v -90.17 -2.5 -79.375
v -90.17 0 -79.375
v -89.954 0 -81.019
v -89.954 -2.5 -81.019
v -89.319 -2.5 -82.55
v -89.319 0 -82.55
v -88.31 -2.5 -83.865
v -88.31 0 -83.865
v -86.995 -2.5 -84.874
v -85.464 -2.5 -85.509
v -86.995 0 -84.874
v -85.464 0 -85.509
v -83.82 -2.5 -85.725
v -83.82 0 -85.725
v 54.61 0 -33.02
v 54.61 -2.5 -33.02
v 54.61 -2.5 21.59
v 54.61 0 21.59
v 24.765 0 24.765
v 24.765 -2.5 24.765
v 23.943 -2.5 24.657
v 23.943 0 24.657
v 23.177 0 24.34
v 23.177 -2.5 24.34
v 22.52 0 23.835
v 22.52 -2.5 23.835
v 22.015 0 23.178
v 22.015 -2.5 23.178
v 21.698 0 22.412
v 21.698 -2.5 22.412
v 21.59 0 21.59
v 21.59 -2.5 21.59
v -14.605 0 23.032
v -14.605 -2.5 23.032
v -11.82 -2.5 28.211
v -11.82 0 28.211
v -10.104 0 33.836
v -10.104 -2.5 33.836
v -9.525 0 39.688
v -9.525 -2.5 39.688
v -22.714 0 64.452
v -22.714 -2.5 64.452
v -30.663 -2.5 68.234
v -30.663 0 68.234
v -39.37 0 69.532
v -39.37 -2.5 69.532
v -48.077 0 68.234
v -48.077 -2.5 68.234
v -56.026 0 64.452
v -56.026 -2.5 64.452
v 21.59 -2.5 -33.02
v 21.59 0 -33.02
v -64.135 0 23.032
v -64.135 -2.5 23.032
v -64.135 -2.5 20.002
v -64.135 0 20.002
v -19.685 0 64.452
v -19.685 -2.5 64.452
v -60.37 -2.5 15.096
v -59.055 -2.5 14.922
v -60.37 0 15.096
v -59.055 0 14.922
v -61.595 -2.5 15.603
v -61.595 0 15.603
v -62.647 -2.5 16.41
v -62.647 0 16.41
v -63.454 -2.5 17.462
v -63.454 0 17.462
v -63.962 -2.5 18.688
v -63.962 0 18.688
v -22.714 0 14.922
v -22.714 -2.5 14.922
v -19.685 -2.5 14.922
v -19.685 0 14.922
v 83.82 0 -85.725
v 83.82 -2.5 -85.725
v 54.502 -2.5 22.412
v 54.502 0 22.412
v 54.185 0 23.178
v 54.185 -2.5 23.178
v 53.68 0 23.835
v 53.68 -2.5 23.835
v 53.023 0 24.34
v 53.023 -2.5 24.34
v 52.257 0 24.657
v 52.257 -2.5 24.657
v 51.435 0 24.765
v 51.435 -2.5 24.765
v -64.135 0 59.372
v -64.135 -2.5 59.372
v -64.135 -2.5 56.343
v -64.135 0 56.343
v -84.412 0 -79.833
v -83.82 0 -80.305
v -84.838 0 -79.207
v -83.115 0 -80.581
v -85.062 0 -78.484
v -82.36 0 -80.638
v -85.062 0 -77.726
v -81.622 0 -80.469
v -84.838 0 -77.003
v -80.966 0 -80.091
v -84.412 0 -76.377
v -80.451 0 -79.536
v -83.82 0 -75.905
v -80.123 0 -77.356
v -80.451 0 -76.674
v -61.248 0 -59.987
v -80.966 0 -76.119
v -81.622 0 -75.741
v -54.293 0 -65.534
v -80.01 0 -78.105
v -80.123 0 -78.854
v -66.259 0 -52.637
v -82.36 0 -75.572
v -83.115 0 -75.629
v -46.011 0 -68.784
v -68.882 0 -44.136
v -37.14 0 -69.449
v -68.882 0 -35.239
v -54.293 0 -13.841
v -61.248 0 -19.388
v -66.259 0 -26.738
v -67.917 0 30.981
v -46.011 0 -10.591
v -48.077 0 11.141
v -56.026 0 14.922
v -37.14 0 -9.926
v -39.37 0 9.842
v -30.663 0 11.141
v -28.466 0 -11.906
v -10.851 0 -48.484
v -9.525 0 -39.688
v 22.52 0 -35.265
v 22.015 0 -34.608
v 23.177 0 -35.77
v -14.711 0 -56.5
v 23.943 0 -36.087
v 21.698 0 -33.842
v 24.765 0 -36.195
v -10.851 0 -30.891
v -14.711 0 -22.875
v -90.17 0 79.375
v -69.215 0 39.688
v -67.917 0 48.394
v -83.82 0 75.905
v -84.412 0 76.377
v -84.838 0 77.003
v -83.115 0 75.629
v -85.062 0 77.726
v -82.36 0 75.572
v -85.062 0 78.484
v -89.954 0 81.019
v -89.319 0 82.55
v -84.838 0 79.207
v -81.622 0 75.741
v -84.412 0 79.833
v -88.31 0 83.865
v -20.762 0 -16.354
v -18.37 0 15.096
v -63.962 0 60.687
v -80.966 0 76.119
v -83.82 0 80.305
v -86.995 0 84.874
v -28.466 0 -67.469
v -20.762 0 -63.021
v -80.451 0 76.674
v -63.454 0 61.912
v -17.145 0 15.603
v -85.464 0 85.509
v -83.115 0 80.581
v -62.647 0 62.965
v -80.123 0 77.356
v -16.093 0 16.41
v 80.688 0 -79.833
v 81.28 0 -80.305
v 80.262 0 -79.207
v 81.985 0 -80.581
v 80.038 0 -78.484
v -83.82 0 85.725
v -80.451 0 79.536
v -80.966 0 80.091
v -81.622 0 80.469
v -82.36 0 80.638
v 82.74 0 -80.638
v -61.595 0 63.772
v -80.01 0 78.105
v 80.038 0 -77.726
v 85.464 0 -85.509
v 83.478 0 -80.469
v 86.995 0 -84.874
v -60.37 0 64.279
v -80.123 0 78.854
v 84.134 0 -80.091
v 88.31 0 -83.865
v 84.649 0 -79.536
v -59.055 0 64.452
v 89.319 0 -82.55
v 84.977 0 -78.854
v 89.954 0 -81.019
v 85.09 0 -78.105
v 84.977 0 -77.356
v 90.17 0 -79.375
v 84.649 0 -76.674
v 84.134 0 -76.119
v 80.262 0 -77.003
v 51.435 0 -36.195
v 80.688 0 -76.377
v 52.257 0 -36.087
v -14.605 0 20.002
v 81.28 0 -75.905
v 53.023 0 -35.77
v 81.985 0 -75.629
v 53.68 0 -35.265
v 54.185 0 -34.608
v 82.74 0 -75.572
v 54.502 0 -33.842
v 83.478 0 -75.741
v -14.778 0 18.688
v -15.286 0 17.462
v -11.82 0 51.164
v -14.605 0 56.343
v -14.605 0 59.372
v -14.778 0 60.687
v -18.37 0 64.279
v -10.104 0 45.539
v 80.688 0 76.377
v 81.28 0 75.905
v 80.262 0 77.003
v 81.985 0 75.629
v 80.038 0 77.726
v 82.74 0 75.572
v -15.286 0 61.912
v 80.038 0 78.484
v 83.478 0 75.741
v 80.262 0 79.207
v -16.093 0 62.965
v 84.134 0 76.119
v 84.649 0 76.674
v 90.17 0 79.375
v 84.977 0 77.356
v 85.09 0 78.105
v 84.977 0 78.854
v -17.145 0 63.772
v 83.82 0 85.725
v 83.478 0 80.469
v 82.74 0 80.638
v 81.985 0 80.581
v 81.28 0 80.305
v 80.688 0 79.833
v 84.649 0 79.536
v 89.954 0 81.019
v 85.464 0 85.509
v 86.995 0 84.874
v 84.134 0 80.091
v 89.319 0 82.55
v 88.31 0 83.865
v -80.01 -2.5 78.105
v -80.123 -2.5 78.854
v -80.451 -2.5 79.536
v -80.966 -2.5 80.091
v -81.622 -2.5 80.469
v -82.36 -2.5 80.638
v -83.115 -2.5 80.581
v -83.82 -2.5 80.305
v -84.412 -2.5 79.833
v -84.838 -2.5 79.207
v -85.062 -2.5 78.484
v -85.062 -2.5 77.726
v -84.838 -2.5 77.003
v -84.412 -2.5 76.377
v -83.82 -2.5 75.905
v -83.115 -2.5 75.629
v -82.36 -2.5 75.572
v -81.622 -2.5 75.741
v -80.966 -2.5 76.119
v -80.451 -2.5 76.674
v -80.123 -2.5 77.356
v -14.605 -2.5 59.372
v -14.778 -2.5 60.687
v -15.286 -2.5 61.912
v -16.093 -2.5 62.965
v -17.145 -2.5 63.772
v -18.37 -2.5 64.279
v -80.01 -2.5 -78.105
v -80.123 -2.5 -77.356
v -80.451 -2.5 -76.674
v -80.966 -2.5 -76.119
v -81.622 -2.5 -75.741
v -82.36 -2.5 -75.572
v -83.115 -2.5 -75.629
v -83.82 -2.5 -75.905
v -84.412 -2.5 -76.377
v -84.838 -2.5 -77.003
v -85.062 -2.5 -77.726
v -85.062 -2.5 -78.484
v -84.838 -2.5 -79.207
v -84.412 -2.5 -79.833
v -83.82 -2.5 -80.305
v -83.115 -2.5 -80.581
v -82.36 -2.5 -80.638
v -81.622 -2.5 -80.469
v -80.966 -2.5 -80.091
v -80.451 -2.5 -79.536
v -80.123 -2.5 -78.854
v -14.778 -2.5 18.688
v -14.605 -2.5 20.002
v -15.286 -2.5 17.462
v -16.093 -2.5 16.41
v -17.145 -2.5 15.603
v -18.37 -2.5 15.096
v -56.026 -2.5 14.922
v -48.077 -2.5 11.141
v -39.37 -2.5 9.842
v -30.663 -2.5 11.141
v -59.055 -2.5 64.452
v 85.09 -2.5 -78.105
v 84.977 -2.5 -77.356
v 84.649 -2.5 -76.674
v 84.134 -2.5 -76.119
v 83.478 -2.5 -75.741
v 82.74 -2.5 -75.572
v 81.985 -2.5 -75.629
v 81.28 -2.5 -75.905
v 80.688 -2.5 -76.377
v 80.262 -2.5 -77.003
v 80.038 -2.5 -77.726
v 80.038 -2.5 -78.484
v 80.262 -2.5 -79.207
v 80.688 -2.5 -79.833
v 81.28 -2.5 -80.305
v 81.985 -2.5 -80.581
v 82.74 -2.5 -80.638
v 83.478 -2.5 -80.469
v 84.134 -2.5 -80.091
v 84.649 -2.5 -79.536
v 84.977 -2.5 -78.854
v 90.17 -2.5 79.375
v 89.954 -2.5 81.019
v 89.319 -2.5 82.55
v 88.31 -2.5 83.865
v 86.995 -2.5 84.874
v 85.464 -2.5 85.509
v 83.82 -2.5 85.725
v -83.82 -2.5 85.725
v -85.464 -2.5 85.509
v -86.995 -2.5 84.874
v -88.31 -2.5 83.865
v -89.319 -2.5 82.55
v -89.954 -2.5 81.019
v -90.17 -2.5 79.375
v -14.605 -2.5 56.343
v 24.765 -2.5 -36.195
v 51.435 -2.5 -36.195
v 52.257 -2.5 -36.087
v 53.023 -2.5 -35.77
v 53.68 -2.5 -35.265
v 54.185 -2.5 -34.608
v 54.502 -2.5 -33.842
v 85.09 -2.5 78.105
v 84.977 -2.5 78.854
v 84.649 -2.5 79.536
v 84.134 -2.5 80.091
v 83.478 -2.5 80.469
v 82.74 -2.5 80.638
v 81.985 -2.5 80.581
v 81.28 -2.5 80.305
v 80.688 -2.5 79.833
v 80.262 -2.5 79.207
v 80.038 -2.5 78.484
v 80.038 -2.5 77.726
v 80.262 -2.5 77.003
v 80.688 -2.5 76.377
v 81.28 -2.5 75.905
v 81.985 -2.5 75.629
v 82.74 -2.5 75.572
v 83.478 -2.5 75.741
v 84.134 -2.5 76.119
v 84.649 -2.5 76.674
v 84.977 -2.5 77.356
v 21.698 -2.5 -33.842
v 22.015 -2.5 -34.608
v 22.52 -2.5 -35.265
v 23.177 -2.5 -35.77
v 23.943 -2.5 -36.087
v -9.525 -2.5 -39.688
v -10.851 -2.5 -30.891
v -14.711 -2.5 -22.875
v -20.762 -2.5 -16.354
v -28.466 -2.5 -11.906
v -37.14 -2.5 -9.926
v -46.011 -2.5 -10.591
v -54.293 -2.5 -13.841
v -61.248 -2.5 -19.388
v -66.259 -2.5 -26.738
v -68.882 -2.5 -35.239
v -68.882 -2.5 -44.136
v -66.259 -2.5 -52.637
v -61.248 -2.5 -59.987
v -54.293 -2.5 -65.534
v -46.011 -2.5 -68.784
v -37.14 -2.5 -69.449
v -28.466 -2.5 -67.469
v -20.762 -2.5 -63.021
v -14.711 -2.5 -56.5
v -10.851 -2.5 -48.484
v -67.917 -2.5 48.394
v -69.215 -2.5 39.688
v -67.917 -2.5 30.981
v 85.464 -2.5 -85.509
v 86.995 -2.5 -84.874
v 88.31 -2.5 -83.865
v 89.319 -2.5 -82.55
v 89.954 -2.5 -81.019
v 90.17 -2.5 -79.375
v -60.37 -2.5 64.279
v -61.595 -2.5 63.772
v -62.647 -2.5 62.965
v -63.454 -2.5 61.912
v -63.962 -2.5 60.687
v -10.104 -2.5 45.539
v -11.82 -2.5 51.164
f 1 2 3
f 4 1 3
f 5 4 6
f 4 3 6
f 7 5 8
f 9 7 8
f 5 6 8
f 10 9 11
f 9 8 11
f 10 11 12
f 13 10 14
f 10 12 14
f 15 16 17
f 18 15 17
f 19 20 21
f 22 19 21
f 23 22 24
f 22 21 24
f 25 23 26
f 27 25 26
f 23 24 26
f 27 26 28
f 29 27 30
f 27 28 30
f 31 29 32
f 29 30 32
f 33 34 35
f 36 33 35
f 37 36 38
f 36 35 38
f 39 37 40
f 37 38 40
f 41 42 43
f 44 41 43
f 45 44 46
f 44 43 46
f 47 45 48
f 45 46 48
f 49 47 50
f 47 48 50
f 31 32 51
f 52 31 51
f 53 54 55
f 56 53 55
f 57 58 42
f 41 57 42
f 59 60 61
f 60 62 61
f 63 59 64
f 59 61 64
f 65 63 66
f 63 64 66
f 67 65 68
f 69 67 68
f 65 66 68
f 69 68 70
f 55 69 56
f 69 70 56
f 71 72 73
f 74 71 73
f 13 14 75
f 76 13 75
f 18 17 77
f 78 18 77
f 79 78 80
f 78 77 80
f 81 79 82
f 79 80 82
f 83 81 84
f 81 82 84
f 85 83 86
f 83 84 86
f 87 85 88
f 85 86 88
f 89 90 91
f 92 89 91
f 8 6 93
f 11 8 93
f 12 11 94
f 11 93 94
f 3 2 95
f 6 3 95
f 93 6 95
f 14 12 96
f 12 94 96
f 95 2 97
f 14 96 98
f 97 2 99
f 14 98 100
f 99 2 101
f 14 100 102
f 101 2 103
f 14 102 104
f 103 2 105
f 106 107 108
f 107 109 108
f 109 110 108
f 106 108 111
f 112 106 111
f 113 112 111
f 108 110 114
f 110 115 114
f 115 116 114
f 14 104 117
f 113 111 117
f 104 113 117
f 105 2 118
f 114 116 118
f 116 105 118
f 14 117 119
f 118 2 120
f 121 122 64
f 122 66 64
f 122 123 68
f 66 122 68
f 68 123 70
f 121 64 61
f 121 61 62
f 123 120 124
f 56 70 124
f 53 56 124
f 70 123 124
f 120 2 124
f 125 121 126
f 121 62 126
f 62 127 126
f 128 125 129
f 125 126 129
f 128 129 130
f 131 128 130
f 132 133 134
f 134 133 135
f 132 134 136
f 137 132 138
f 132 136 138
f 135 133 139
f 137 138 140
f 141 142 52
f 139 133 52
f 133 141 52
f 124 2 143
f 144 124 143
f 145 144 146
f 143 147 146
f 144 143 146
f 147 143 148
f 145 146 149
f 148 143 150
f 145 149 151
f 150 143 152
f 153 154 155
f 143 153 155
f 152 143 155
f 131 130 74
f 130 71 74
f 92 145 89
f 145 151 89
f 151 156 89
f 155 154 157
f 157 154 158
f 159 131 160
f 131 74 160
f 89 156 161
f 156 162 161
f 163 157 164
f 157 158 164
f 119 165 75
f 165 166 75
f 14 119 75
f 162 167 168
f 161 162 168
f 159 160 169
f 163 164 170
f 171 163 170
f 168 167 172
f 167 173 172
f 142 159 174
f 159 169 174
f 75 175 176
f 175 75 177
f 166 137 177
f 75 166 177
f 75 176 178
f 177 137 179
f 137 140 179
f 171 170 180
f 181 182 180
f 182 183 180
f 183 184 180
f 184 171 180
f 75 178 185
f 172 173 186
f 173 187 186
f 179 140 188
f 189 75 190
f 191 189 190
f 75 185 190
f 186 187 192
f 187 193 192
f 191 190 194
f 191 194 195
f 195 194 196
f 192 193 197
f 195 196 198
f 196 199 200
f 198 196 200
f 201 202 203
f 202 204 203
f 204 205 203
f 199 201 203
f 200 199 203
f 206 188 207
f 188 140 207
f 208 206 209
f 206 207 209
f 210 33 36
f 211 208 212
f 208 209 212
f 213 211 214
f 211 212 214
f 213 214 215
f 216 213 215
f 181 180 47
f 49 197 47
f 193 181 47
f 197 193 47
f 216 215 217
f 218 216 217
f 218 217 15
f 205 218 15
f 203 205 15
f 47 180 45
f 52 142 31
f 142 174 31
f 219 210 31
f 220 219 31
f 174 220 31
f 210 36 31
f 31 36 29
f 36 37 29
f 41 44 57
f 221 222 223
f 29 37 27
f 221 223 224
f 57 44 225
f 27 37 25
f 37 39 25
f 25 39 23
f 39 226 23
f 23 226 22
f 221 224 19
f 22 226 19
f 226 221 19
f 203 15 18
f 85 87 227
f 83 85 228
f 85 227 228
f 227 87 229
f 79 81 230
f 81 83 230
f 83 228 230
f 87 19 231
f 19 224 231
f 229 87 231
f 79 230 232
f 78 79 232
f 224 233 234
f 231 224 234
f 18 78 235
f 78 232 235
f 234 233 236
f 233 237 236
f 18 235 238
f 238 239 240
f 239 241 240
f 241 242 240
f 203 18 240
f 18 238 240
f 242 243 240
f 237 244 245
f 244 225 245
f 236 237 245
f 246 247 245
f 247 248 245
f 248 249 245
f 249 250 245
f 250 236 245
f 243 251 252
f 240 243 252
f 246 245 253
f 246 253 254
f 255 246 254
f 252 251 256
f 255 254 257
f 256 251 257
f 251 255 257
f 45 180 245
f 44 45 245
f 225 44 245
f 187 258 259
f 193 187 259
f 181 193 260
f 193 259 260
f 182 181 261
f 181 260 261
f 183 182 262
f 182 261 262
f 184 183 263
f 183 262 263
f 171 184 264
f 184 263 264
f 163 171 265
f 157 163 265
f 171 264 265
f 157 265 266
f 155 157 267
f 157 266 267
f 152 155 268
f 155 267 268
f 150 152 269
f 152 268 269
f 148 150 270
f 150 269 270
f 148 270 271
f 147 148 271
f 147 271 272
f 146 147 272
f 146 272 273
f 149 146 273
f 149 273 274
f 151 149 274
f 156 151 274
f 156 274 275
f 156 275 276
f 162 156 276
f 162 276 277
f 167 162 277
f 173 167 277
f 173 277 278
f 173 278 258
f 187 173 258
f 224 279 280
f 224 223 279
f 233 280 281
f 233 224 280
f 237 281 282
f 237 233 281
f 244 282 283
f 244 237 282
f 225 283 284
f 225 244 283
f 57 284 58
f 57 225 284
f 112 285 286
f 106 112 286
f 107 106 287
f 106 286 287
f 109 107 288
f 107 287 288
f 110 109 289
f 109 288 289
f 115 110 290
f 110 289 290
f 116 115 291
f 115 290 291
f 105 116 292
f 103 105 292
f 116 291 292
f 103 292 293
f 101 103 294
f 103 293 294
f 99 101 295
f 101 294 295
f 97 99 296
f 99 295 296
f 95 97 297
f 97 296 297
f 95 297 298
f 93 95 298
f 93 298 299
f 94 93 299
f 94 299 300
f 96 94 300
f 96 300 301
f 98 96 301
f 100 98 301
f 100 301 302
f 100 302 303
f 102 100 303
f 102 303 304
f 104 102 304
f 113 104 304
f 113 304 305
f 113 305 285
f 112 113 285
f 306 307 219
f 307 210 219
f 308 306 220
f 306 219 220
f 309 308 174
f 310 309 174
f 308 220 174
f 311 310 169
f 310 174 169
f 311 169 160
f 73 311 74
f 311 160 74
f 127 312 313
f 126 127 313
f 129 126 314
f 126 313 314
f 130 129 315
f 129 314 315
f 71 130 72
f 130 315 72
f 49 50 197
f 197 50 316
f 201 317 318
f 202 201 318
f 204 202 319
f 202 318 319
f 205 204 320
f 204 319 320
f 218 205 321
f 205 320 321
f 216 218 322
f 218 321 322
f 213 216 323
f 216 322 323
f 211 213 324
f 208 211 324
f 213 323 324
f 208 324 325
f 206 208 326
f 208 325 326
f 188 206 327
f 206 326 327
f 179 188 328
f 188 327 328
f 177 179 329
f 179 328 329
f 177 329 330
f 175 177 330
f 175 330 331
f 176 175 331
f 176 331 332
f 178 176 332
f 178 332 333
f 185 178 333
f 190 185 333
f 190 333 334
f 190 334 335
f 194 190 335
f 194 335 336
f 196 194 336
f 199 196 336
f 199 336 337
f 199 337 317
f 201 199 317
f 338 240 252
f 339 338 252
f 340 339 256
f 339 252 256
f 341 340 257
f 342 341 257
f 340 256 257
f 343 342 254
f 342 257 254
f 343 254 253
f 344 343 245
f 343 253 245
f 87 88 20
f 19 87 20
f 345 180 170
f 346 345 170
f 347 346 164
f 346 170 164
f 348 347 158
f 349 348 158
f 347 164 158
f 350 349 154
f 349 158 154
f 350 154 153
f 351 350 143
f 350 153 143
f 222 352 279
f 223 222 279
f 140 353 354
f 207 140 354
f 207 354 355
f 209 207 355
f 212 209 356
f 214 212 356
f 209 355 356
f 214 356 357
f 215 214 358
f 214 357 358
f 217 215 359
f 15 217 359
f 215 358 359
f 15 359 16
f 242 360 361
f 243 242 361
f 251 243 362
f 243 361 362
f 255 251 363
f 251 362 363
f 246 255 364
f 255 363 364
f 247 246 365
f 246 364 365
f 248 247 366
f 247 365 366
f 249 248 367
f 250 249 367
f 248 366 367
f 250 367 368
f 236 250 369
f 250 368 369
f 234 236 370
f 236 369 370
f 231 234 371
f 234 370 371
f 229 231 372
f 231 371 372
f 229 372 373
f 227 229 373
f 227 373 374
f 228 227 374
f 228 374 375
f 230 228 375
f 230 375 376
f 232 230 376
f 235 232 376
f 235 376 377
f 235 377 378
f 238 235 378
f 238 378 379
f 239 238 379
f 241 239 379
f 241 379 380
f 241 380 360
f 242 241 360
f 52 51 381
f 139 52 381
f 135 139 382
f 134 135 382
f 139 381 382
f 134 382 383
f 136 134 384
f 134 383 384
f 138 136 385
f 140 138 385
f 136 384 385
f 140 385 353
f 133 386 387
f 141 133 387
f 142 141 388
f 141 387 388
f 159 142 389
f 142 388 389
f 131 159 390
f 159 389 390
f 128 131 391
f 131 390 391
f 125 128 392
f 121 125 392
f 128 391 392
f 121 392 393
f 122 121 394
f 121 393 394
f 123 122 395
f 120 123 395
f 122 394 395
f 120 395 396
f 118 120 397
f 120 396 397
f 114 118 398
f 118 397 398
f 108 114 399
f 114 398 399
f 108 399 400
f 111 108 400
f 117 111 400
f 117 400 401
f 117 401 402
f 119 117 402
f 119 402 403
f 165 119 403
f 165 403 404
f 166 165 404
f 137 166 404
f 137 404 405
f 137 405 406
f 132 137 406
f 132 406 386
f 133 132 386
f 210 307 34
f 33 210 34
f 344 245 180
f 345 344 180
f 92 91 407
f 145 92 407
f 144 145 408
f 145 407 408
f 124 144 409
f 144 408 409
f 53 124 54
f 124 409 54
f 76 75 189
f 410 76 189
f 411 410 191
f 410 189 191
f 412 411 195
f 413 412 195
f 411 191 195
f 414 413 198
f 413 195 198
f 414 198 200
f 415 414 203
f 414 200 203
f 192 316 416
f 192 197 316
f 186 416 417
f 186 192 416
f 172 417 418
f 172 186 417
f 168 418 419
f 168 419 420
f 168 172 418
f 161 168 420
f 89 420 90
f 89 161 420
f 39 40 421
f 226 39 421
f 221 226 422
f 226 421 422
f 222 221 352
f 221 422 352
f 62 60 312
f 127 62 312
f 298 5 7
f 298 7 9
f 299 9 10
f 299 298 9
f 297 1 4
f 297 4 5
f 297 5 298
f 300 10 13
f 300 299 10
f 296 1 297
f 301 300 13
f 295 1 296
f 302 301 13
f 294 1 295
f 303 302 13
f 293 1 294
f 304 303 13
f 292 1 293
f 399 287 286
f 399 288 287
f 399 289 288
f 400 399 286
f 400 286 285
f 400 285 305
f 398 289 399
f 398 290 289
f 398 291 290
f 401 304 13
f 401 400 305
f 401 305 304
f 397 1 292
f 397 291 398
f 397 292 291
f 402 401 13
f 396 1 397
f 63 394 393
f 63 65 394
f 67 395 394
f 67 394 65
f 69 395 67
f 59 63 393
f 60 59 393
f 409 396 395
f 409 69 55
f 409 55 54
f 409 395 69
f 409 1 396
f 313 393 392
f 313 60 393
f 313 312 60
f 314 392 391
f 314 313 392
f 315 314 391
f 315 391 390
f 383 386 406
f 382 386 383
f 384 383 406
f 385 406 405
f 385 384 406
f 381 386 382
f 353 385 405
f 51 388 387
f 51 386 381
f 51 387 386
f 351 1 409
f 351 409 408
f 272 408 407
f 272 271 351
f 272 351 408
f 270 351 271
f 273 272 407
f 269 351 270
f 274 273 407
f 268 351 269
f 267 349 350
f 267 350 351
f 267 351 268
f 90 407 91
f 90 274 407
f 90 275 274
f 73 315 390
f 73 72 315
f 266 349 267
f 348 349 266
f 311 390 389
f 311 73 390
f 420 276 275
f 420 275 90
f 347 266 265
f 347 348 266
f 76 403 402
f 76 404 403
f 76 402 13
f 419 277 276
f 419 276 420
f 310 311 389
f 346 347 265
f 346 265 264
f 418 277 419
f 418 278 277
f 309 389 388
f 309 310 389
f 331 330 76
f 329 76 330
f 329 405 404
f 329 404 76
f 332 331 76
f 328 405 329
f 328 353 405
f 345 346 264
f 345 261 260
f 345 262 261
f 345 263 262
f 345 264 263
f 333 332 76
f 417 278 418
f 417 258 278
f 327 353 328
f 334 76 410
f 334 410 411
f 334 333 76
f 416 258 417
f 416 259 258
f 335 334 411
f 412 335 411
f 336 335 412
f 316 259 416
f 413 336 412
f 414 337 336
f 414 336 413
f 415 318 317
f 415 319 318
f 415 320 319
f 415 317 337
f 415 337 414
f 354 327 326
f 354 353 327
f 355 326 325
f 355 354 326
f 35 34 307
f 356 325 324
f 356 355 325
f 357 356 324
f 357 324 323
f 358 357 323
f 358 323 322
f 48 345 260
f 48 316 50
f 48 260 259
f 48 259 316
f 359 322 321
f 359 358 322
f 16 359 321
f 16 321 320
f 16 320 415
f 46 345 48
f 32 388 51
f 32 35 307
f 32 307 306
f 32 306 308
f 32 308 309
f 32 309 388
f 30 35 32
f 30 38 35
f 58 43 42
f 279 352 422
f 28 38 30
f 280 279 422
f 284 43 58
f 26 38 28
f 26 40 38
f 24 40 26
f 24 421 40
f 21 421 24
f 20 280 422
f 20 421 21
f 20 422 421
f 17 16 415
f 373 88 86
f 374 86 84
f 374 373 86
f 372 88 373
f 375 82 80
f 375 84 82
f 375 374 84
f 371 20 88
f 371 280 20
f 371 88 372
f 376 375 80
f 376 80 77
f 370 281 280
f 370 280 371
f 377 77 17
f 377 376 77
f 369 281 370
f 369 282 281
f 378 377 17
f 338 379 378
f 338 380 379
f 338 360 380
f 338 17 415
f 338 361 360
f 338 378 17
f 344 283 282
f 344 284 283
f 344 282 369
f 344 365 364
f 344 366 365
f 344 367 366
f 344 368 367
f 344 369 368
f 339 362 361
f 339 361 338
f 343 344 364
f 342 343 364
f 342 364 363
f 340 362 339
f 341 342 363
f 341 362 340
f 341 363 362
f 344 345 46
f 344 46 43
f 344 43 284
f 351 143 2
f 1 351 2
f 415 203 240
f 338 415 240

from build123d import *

# Parameters (mm, degrees)
F1_DEPTH = 2.5
F3_DEPTH = 25.4
F4_R     = 29.845
F5_DEPTH = 25.4
F6_R     = 2.54
F7_DEPTH = 25.4
F8_R     = 5.08


with BuildPart() as f1:
    # F0 (on Front) → F1 (new body)
    with BuildSketch(Plane.XZ):
        with BuildLine():
            ThreePointArc((90.17, 79.375), (88.3101280605, 83.8651280605), (83.82, 85.725))
            Line((83.82, 85.725), (-83.82, 85.725))
            ThreePointArc((-83.82, 85.725), (-88.3101280605, 83.8651280605), (-90.17, 79.375))
            Line((-90.17, 79.375), (-90.17, -79.375))
            ThreePointArc((-90.17, -79.375), (-88.3101280605, -83.8651280605), (-83.82, -85.725))
            Line((-83.82, -85.725), (83.82, -85.725))
            ThreePointArc((83.82, -85.725), (88.3101280605, -83.8651280605), (90.17, -79.375))
            Line((90.17, -79.375), (90.17, 79.375))
        make_face()
    extrude(amount=F1_DEPTH)

    # F2 (on face) → F3 (cut)
    with BuildSketch(Plane.XZ.offset(2.5)):
        with BuildLine():
            Line((51.435, 24.765), (24.765, 24.765))
            ThreePointArc((24.765, 24.765), (22.5199359697, 23.8350640303), (21.59, 21.59))
            Line((21.59, 21.59), (21.59, -33.02))
            ThreePointArc((21.59, -33.02), (22.5199359697, -35.2650640303), (24.765, -36.195))
            Line((24.765, -36.195), (51.435, -36.195))
            ThreePointArc((51.435, -36.195), (53.6800640303, -35.2650640303), (54.61, -33.02))
            Line((54.61, -33.02), (54.61, 21.59))
            ThreePointArc((54.61, 21.59), (53.6800640303, 23.8350640303), (51.435, 24.765))
        make_face()
    extrude(amount=-F3_DEPTH, mode=Mode.SUBTRACT)

    # F4 (on face) → F5 (cut)
    with BuildSketch(Plane.XZ.offset(2.5)):
        with BuildLine():
            ThreePointArc((-14.605, 23.0316061483), (-10.8232361729, 30.9808186575), (-9.525, 39.6875))
            ThreePointArc((-9.525, 39.6875), (-10.8232361729, 48.3941813425), (-14.605, 56.3433938517))
            Line((-14.605, 56.3433938517), (-14.605, 23.0316061483))
        make_face()
        with BuildLine():
            Line((-14.605, 23.0316061483), (-14.605, 56.3433938517))
            ThreePointArc((-14.605, 56.3433938517), (-18.2663981155, 60.7911018845), (-22.7141061483, 64.4525))
            Line((-22.7141061483, 64.4525), (-56.0258938517, 64.4525))
            ThreePointArc((-56.0258938517, 64.4525), (-60.4736018845, 60.7911018845), (-64.135, 56.3433938517))
            Line((-64.135, 56.3433938517), (-64.135, 23.0316061483))
            ThreePointArc((-64.135, 23.0316061483), (-60.4736018845, 18.5838981155), (-56.0258938517, 14.9225))
            Line((-56.0258938517, 14.9225), (-22.7141061483, 14.9225))
            ThreePointArc((-22.7141061483, 14.9225), (-18.2663981155, 18.5838981155), (-14.605, 23.0316061483))
        make_face()
        with BuildLine():
            ThreePointArc((-22.7141061483, 64.4525), (-18.2663981155, 60.7911018845), (-14.605, 56.3433938517))
            Line((-14.605, 56.3433938517), (-14.605, 64.4525))
            Line((-14.605, 64.4525), (-22.7141061483, 64.4525))
        make_face()
        with BuildLine():
            Line((-14.605, 14.9225), (-14.605, 23.0316061483))
            ThreePointArc((-14.605, 23.0316061483), (-18.2663981155, 18.5838981155), (-22.7141061483, 14.9225))
            Line((-22.7141061483, 14.9225), (-14.605, 14.9225))
        make_face()
        with BuildLine():
            Line((-56.0258938517, 64.4525), (-22.7141061483, 64.4525))
            ThreePointArc((-22.7141061483, 64.4525), (-39.37, 69.5325), (-56.0258938517, 64.4525))
        make_face()
        with BuildLine():
            ThreePointArc((-56.0258938517, 14.9225), (-39.37, 9.8425), (-22.7141061483, 14.9225))
            Line((-22.7141061483, 14.9225), (-56.0258938517, 14.9225))
        make_face()
        with BuildLine():
            ThreePointArc((-64.135, 56.3433938517), (-60.4736018845, 60.7911018845), (-56.0258938517, 64.4525))
            Line((-56.0258938517, 64.4525), (-64.135, 64.4525))
            Line((-64.135, 64.4525), (-64.135, 56.3433938517))
        make_face()
        with BuildLine():
            Line((-64.135, 14.9225), (-56.0258938517, 14.9225))
            ThreePointArc((-56.0258938517, 14.9225), (-60.4736018845, 18.5838981155), (-64.135, 23.0316061483))
            Line((-64.135, 23.0316061483), (-64.135, 14.9225))
        make_face()
        with BuildLine():
            Line((-64.135, 23.0316061483), (-64.135, 56.3433938517))
            ThreePointArc((-64.135, 56.3433938517), (-69.215, 39.6875), (-64.135, 23.0316061483))
        make_face()
        with Locations((-39.37, -39.6875)):
            Circle(F4_R)
    extrude(amount=-F5_DEPTH, mode=Mode.SUBTRACT)

    # F6 (on face) → F7 (cut)
    with BuildSketch(Plane.XZ.offset(2.5)):
        with Locations((-82.55, 78.105)):
            Circle(F6_R)
        with Locations((82.55, 78.105)):
            Circle(F6_R)
        with Locations((82.55, -78.105)):
            Circle(F6_R)
        with Locations((-82.55, -78.105)):
            Circle(F6_R)
    extrude(amount=-F7_DEPTH, mode=Mode.SUBTRACT)

    # F8
    f8_edges = [f1.edges().sort_by_distance(p)[0] for p in [
        (-64.135, -1.25, 14.9225),
        (-14.605, -1.25, 14.9225),
        (-14.605, -1.25, 64.4525),
        (-64.135, -1.25, 64.4525),
    ]]
    fillet(f8_edges, radius=F8_R)


solid = f1.part
